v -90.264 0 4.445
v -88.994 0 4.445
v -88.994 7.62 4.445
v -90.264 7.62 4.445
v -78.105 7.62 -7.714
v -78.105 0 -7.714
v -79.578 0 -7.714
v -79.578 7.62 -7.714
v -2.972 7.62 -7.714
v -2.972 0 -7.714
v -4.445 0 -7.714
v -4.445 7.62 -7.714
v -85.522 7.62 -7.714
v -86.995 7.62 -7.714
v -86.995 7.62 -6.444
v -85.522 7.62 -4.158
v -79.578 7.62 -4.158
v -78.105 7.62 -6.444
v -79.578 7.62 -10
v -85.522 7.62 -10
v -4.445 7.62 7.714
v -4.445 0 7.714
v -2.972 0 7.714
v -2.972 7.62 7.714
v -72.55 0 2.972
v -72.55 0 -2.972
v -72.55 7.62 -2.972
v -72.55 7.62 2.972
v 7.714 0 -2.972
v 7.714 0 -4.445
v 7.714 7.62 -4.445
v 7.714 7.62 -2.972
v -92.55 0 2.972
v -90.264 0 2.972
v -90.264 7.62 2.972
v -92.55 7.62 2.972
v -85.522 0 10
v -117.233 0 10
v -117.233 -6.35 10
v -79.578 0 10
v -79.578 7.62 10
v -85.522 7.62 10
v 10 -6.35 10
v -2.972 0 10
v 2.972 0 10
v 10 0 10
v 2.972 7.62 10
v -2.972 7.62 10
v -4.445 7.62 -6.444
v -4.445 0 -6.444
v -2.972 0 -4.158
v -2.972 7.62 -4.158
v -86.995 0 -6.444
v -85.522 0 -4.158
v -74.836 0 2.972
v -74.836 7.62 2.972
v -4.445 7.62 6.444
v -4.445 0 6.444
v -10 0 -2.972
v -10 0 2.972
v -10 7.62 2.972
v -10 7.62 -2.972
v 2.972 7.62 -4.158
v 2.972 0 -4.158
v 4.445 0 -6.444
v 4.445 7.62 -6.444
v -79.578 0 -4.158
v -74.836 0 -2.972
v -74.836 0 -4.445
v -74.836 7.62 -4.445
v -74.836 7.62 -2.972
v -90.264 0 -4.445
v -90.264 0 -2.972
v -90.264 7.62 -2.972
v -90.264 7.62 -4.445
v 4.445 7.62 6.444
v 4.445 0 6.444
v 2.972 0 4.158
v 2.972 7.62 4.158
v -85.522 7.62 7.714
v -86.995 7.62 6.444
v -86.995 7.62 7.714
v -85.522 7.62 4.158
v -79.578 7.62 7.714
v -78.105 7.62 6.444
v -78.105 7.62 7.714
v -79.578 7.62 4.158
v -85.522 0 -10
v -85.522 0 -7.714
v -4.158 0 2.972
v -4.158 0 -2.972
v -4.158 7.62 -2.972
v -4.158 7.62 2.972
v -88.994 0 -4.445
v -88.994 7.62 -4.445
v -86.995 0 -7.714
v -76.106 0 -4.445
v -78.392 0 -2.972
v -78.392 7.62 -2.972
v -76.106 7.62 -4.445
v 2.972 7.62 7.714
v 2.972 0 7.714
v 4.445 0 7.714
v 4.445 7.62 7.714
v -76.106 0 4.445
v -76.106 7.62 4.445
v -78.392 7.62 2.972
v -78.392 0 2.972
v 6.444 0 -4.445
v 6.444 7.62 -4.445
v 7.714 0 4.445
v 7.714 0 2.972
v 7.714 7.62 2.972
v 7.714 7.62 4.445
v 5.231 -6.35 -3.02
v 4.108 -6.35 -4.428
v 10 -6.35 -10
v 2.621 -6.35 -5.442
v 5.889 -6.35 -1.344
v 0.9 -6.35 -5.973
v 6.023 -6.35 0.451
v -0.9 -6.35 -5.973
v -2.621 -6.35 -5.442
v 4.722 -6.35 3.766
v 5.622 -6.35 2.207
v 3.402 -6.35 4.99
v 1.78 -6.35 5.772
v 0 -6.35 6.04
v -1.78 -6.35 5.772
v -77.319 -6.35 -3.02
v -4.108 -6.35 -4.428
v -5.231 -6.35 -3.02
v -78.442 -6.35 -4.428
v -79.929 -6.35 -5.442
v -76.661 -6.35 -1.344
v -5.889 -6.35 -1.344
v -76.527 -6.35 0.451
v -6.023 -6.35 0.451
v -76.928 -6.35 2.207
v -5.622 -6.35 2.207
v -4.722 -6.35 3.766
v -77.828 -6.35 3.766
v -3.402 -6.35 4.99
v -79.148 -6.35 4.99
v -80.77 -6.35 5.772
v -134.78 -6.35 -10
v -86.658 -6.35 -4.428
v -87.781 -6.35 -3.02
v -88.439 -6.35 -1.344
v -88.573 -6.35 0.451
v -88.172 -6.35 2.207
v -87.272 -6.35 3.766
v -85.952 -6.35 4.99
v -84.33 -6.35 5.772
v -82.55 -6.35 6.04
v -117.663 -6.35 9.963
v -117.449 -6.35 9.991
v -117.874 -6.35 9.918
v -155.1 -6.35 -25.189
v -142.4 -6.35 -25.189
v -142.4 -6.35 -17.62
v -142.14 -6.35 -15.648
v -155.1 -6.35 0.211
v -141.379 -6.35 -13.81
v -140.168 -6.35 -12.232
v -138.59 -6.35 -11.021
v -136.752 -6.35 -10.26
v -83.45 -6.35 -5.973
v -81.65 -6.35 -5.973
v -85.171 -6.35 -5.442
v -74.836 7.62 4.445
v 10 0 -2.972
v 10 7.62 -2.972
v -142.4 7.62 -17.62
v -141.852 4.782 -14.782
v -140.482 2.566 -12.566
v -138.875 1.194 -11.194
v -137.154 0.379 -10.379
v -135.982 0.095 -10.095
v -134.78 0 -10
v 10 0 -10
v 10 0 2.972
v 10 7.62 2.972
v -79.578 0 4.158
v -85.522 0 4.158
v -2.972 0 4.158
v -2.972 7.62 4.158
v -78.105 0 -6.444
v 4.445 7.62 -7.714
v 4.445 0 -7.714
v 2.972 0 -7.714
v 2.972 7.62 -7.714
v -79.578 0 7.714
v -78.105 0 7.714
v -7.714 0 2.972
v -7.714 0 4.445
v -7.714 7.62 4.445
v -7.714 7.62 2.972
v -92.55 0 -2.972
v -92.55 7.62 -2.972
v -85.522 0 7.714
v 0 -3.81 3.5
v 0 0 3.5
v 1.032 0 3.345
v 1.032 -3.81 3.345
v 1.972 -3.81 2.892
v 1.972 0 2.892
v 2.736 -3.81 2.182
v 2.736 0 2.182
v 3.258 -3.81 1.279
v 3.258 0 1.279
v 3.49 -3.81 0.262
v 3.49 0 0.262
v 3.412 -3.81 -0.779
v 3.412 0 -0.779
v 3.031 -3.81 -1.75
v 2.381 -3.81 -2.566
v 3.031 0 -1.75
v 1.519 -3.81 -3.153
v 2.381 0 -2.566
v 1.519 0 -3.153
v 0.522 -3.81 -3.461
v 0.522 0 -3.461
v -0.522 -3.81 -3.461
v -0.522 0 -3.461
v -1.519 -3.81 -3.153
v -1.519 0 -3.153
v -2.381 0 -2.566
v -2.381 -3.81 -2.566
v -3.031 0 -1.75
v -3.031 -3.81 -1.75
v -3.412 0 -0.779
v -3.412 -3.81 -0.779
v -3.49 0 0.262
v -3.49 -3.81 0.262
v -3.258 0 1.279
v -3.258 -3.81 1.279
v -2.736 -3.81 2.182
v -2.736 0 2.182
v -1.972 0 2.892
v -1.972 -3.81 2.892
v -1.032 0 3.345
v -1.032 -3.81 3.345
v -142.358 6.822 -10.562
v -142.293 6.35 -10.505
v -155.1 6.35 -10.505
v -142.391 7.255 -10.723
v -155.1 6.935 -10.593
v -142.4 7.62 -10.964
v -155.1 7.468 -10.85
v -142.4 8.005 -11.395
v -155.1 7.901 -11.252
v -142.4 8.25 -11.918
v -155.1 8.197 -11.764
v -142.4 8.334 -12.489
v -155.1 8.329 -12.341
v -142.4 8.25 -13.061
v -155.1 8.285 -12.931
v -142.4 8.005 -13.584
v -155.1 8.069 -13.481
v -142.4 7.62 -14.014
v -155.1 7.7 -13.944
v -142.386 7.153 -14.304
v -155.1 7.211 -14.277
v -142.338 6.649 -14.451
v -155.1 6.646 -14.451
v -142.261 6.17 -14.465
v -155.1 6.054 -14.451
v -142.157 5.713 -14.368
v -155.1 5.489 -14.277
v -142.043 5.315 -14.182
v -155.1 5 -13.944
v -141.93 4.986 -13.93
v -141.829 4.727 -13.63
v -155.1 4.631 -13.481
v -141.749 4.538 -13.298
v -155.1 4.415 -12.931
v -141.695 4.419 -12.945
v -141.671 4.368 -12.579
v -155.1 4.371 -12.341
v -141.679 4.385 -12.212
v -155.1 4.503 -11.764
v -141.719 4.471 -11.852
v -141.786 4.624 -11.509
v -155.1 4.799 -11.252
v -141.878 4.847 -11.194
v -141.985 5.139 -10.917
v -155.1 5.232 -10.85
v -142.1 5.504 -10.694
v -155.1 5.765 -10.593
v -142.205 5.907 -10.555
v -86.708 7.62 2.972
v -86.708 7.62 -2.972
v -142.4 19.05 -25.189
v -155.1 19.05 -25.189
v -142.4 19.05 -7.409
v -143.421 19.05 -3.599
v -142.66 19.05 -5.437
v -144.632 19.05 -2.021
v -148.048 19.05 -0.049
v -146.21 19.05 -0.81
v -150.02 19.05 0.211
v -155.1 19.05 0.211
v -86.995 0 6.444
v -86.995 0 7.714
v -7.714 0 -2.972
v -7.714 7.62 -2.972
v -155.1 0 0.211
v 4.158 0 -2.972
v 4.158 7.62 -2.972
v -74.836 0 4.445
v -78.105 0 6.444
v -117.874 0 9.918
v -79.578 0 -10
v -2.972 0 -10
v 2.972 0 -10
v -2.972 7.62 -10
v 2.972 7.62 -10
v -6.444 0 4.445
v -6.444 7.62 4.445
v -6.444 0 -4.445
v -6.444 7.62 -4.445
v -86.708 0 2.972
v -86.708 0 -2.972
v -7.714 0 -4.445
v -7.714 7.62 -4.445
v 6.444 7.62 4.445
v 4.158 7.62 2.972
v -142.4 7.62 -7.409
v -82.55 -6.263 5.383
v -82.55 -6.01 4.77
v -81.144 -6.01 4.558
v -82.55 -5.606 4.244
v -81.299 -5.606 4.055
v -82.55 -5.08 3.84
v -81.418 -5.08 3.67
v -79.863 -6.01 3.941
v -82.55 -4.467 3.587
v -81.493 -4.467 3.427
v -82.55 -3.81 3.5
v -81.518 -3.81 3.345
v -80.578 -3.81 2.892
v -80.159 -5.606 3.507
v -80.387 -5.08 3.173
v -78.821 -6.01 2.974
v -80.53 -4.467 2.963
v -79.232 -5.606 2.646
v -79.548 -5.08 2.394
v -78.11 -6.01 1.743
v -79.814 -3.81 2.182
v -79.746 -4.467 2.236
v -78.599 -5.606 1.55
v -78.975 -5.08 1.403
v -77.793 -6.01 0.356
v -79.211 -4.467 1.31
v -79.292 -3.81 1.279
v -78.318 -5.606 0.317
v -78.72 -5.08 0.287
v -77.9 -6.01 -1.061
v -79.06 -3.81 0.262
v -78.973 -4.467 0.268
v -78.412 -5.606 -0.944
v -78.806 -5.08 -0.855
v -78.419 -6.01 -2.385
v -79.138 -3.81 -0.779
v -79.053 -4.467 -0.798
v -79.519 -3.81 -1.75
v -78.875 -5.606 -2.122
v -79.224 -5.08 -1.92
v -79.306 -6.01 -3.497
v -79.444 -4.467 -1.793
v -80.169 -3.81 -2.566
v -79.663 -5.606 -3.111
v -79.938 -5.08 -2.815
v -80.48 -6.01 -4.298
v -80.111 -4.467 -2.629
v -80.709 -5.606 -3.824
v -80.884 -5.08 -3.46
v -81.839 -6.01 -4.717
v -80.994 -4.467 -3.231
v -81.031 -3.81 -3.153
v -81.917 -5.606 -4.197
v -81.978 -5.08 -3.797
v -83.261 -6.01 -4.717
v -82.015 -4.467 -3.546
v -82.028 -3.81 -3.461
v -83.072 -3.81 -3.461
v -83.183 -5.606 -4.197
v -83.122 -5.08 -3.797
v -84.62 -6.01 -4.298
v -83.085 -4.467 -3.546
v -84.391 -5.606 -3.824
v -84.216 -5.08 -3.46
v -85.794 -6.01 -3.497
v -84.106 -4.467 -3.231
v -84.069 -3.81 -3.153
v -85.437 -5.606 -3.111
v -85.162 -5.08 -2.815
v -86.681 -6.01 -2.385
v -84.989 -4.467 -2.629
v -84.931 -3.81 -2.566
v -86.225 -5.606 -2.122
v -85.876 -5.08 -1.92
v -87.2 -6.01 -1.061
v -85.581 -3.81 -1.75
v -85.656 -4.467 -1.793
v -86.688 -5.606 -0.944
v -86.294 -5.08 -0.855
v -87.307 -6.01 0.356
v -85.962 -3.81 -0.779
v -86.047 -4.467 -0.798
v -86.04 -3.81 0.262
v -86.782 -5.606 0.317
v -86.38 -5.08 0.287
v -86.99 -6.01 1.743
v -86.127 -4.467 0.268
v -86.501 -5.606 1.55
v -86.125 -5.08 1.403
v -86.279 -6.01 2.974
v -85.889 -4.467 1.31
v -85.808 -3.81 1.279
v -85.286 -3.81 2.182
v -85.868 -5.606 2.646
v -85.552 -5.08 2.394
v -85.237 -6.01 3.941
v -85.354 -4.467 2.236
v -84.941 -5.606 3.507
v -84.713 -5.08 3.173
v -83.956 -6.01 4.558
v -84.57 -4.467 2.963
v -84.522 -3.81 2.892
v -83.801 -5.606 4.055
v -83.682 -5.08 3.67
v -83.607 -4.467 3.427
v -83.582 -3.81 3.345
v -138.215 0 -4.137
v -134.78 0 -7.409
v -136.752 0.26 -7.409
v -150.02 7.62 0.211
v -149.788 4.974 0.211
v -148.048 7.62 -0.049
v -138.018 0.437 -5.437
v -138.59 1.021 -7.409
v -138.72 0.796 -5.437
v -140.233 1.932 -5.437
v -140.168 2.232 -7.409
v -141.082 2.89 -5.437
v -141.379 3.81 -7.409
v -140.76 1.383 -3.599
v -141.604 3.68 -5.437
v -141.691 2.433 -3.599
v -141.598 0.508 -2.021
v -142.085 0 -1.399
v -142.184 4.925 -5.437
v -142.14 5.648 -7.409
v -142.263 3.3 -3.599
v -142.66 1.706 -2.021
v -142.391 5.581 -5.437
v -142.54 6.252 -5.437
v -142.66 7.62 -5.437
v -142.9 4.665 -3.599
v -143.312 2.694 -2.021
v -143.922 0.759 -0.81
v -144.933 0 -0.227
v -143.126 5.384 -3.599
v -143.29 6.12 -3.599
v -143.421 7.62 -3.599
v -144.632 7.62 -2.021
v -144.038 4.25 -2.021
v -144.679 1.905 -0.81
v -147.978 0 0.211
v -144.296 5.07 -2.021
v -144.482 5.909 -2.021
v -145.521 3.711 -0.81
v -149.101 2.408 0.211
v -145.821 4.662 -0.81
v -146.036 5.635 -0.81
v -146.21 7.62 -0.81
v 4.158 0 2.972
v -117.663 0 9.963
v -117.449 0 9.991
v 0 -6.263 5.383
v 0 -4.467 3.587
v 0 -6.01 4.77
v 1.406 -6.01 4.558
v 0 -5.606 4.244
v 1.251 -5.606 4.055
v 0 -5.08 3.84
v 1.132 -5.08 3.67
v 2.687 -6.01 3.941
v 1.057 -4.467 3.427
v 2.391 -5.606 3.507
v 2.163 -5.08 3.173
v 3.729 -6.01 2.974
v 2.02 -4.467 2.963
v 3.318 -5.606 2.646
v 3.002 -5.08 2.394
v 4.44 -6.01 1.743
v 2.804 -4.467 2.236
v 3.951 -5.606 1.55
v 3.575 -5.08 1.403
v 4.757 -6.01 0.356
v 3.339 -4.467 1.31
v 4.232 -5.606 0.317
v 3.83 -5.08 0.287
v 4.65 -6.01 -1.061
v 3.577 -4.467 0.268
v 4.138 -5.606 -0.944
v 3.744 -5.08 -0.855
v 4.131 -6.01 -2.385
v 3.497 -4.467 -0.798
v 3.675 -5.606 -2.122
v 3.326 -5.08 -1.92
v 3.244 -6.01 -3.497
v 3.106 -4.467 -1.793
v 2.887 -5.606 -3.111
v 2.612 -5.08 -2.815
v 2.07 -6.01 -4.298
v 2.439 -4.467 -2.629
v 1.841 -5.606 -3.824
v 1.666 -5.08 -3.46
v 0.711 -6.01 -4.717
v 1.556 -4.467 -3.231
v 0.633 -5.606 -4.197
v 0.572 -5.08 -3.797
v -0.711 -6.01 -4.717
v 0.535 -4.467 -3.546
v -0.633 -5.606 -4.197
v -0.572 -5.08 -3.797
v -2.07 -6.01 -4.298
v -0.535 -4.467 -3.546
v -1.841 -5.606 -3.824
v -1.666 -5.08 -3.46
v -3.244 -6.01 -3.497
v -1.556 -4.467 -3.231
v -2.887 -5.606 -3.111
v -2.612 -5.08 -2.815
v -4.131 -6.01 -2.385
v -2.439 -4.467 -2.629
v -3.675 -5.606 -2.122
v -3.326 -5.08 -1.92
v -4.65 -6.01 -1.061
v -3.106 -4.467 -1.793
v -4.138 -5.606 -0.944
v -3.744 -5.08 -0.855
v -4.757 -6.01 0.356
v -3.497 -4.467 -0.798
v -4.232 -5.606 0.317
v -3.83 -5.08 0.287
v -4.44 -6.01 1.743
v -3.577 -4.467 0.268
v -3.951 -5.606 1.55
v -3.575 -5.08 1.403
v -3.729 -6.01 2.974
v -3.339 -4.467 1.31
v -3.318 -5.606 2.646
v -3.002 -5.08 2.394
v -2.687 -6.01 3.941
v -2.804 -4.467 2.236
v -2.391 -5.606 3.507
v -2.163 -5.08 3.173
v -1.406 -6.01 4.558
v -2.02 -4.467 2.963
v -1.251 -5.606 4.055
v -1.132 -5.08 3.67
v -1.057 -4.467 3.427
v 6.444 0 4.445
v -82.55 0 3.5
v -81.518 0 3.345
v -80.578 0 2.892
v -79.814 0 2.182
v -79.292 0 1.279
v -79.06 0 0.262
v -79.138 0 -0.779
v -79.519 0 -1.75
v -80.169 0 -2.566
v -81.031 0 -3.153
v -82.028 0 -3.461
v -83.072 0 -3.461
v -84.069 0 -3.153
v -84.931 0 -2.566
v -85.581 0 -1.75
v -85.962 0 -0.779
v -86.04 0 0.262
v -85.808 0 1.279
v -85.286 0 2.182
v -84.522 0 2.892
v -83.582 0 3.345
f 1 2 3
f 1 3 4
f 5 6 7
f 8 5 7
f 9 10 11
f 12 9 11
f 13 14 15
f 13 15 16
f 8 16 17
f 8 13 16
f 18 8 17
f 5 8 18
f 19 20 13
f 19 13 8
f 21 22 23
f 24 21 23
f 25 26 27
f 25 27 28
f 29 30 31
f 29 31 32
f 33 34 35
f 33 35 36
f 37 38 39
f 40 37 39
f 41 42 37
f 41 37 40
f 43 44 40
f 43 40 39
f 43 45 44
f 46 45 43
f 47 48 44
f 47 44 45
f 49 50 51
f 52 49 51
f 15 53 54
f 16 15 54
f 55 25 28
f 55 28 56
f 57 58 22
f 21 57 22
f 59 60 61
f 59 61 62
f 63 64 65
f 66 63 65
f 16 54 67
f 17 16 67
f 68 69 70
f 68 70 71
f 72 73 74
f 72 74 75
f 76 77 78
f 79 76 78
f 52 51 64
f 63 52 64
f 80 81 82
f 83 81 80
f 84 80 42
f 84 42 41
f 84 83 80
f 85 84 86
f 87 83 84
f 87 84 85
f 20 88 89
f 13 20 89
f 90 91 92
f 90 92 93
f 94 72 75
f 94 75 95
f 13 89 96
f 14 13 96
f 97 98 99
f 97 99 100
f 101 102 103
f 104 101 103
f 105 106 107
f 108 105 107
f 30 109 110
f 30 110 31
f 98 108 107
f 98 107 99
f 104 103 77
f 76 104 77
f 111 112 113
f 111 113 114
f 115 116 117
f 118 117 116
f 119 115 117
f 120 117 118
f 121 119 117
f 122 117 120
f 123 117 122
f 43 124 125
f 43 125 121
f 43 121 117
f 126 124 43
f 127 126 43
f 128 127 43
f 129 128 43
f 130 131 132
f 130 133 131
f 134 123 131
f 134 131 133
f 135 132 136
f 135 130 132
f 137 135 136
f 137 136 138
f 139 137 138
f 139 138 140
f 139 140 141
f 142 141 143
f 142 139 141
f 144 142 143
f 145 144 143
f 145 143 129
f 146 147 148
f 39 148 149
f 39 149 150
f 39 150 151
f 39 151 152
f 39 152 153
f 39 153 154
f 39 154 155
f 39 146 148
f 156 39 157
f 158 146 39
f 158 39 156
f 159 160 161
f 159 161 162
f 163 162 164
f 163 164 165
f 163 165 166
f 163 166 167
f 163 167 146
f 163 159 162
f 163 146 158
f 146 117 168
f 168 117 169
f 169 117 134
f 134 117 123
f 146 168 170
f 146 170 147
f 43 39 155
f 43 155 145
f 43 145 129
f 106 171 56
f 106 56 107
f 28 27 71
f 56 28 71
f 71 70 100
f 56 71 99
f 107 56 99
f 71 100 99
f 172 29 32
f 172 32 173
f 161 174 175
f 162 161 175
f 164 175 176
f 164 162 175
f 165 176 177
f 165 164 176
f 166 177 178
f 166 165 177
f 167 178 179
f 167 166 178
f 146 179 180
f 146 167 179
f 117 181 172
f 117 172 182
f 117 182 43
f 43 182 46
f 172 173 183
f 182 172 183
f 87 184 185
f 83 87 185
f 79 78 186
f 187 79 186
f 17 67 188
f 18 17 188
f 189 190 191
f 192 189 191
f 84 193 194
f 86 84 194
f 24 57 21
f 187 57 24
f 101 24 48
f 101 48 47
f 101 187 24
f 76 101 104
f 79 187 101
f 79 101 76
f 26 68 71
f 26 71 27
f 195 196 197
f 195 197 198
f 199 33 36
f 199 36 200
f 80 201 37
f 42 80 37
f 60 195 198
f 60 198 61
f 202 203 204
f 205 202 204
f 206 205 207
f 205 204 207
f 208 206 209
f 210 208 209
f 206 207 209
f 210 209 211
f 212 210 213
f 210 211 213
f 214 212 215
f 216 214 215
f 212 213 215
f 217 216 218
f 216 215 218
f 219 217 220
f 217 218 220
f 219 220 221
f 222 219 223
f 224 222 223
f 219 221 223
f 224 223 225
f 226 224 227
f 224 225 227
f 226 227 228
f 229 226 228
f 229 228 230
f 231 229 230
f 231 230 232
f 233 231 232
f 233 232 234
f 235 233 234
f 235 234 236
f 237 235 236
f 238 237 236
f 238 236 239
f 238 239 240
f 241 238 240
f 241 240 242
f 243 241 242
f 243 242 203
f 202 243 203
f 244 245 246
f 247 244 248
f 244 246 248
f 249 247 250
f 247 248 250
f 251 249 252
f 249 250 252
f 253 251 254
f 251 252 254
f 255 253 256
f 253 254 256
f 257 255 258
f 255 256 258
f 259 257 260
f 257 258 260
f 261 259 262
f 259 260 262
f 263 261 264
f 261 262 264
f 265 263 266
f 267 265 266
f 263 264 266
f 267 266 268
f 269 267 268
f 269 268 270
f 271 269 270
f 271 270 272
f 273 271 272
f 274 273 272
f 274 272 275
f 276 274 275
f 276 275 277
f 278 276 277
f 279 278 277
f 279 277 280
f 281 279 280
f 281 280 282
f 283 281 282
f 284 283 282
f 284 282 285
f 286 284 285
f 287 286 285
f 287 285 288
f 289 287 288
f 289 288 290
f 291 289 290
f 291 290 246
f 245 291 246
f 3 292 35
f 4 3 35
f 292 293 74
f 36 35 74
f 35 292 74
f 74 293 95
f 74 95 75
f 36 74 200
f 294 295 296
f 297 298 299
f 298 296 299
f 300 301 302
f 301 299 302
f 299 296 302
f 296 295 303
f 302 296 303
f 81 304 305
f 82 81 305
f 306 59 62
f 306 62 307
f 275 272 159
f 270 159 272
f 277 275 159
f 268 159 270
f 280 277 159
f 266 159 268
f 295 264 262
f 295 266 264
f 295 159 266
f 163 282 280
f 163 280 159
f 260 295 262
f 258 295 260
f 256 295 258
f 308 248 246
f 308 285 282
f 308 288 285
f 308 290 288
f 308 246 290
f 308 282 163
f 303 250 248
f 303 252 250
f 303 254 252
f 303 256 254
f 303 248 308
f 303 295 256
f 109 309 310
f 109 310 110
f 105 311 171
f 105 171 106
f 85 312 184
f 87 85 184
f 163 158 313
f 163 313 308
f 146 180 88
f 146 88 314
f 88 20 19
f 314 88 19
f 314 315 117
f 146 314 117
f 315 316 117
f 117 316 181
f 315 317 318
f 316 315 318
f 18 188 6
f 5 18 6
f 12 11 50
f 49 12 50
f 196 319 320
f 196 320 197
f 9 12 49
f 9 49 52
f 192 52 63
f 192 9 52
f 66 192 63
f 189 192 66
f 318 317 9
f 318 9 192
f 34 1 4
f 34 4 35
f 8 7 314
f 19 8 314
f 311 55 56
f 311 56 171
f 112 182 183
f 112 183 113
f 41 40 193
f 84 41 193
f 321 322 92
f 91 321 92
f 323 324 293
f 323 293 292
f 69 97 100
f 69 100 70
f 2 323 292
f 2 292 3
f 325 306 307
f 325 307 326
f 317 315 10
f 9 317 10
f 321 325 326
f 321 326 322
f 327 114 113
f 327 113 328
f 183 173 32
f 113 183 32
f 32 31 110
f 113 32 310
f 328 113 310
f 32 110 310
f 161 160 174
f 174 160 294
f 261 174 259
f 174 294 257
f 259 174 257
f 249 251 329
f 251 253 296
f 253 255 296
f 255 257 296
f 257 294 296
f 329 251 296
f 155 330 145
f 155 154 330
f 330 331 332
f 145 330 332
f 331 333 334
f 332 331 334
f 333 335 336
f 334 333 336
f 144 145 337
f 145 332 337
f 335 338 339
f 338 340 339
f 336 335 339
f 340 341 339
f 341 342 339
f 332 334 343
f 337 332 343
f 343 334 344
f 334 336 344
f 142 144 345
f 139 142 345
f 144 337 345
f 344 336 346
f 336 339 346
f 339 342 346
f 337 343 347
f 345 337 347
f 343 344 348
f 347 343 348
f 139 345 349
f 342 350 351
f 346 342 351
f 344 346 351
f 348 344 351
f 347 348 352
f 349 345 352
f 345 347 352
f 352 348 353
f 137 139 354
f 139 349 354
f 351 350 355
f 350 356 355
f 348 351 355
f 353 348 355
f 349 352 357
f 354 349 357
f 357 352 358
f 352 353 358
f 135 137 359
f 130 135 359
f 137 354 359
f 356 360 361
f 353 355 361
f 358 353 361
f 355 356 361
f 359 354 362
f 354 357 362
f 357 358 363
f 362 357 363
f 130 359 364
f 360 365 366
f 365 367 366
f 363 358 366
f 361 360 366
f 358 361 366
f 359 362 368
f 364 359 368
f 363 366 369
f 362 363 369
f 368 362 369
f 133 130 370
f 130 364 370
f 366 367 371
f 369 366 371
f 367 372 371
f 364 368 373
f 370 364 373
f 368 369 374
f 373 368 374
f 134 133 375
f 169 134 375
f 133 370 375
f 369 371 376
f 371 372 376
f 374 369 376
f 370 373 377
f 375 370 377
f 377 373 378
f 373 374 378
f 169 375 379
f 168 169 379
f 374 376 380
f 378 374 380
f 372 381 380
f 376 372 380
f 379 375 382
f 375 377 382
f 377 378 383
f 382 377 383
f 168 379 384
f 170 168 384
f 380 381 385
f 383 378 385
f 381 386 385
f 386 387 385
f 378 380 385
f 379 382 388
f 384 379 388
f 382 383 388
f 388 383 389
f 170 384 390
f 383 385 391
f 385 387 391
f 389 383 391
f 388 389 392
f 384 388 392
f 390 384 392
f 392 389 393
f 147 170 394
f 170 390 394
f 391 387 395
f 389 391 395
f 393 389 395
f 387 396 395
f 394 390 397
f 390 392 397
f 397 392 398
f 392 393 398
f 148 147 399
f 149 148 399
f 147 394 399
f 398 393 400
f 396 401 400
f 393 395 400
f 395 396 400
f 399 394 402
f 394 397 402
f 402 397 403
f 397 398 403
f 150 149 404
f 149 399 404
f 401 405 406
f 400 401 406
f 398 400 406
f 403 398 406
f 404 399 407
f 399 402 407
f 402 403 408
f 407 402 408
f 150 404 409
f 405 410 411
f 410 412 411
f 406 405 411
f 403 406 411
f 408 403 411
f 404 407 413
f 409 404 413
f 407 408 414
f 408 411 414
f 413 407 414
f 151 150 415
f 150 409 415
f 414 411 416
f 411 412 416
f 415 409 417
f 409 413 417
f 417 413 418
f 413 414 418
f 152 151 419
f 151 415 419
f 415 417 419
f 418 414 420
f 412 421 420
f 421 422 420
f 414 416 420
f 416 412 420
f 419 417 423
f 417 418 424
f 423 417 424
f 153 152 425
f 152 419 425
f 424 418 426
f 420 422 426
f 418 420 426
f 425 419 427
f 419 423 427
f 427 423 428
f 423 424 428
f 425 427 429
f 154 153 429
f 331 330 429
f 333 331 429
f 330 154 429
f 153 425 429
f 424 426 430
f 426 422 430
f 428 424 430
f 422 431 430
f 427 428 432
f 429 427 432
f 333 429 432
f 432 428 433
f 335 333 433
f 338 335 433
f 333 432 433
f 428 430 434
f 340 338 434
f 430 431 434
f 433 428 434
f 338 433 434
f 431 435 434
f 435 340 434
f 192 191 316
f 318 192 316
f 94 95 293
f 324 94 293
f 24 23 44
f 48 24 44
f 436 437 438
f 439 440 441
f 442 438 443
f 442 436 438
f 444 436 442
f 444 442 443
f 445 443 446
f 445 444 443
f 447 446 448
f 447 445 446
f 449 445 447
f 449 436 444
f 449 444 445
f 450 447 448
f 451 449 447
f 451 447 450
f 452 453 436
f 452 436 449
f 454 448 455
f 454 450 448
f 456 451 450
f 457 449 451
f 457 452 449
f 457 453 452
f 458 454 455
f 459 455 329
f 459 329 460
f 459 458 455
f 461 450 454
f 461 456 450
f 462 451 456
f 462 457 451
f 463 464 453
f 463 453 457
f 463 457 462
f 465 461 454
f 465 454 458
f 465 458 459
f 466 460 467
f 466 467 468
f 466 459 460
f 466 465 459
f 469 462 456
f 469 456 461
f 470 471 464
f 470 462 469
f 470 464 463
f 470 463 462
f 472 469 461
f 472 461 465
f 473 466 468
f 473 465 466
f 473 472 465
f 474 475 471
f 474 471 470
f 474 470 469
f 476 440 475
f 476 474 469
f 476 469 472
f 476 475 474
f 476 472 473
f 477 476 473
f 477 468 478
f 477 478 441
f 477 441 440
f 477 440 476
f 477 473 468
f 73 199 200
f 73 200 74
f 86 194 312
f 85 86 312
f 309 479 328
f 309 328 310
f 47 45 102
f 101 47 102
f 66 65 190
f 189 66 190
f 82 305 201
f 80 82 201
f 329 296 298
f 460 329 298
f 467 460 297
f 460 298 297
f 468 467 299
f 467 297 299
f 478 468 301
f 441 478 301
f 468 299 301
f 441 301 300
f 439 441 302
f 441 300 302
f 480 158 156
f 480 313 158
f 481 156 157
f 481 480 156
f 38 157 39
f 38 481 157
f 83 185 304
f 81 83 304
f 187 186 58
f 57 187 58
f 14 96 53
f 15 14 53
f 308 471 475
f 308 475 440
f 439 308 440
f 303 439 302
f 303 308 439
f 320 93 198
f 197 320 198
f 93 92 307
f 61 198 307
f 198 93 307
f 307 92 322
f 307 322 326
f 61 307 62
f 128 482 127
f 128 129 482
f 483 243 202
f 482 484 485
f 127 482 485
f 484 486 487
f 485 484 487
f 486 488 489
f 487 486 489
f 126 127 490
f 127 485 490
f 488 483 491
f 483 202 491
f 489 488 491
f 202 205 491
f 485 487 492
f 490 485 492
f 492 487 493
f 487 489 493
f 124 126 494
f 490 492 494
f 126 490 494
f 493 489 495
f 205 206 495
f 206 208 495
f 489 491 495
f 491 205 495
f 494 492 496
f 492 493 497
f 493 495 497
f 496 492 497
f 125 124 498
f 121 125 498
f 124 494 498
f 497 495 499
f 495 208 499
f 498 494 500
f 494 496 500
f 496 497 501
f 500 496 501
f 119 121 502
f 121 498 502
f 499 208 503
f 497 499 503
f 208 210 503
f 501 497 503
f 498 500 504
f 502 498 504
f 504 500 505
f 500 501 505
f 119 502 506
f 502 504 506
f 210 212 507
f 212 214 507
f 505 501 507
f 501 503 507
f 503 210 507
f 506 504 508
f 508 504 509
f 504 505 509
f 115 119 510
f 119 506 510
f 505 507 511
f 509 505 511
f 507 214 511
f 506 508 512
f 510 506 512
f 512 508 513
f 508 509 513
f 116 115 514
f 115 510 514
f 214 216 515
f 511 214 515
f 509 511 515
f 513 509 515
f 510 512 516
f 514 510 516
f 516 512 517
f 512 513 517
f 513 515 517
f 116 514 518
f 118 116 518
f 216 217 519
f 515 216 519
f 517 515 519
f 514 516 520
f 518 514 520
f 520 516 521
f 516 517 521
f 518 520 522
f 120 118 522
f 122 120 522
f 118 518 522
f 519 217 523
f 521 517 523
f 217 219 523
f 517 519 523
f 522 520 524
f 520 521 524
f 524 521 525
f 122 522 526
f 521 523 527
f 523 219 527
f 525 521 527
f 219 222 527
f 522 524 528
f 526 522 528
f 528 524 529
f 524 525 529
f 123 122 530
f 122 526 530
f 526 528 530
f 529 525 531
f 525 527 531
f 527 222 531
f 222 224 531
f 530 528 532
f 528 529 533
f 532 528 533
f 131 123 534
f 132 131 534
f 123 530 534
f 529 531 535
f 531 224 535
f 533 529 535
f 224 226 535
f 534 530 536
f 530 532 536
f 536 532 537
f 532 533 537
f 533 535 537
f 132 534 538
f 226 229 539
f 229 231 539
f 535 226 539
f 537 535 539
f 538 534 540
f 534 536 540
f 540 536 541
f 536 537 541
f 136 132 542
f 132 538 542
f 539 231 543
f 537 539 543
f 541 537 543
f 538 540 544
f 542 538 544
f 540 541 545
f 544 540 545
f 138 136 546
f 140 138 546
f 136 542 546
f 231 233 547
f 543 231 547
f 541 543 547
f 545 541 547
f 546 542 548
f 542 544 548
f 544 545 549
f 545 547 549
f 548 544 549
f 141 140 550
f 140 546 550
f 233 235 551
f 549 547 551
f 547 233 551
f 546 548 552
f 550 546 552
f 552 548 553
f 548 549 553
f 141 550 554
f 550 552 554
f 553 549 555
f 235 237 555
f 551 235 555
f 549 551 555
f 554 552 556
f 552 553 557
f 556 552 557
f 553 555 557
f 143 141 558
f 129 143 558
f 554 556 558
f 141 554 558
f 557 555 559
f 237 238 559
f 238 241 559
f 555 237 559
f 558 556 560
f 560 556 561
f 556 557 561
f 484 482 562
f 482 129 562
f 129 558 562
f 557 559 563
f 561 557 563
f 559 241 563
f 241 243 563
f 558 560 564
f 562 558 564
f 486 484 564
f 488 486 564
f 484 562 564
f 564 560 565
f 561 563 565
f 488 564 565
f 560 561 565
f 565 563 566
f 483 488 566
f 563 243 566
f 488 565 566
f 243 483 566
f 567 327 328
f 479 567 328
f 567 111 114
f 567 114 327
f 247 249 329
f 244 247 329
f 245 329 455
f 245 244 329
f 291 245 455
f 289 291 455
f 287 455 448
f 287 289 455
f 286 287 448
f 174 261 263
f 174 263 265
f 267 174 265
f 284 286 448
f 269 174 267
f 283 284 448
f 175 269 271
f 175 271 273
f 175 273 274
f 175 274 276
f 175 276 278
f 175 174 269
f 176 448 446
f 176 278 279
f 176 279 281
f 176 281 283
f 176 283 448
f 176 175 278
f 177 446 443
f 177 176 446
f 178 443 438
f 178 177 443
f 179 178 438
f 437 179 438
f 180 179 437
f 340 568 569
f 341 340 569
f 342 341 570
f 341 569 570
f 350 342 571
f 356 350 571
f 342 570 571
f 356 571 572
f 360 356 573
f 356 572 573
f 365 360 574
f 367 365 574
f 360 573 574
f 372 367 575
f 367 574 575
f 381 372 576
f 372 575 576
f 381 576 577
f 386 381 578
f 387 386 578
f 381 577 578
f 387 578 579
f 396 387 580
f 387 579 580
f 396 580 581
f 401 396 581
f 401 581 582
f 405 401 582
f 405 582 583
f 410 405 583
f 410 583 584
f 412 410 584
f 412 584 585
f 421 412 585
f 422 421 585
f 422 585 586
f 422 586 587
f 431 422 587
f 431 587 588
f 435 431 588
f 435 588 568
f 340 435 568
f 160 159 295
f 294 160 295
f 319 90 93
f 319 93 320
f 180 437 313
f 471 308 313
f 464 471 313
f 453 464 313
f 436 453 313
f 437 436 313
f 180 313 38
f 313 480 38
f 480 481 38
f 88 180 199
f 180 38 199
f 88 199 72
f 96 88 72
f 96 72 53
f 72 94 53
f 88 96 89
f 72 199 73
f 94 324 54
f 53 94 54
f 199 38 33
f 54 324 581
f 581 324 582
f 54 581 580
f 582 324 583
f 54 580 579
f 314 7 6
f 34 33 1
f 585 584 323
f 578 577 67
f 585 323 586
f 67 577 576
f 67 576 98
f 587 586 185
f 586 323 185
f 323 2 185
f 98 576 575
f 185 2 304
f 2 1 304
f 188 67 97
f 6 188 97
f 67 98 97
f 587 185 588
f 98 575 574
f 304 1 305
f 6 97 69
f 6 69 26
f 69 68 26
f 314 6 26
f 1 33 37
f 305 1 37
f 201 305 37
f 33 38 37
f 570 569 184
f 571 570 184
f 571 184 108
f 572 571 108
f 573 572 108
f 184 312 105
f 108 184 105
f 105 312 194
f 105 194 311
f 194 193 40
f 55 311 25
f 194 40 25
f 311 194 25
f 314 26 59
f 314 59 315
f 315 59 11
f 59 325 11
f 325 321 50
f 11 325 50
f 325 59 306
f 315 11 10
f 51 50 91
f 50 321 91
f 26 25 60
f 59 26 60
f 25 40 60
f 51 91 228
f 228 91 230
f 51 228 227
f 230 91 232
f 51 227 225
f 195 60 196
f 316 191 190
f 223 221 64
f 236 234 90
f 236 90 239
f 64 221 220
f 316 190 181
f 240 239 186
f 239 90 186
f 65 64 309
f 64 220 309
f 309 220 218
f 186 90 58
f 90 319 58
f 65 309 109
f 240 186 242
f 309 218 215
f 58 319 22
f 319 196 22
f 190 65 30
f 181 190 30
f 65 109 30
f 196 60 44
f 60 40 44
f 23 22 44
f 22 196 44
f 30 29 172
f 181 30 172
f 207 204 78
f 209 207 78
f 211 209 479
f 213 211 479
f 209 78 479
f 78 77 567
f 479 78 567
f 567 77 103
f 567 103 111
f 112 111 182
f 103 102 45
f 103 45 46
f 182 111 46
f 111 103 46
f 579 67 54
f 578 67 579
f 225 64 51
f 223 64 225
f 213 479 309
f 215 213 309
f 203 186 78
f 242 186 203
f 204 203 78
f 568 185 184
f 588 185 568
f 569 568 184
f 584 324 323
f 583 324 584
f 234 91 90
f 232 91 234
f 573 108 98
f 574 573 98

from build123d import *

# Parameters (mm, degrees)
BOSS_EXTRUDE1_DEPTH   = 7.62
BOSS_EXTRUDE1_2_DEPTH = 7.62
BOSS_EXTRUDE1_3_DEPTH = 7.62
BOSS_EXTRUDE1_4_DEPTH = 7.62
SKETCH2_W             = 165.1
SKETCH2_H             = 20
BOSS_EXTRUDE2_DEPTH   = 6.35
LPATTERN2_COUNT       = 2
LPATTERN2_PITCH       = 82.55
CUT_EXTRUDE1_DEPTH    = 157.048617104
FILLET1_R             = 2.54
SKETCH6_W             = 25.4
SKETCH6_H             = 25.4
BOSS_EXTRUDE7_DEPTH   = 12.7
FILLET3_R             = 7.62
FILLET5_R             = 7.62
SKETCH11_R            = 1.984375
CUT_EXTRUDE3_DEPTH    = 169.09345118
SKETCH13_R            = 3.5
CUT_EXTRUDE5_DEPTH    = 159.282684864
FILLET6_R             = 2.54


with BuildPart() as part:
    # Sketch1 → Boss-Extrude1 (new body)
    with BuildSketch(Plane(origin=(0, 0, 0), x_dir=(1, 0, 0), z_dir=(0, 1, 0))):
        Polygon((-2.9718, 10), (-2.9718, 7.714), (-4.4450054, 7.714), (-4.4450054, 6.444), (-2.9718, 4.158), (2.9718, 4.158), (4.4449946, 6.444), (4.4449946, 7.714), (2.9718, 7.714), (2.9718, 10), align=None)
    boss_extrude1 = extrude(amount=BOSS_EXTRUDE1_DEPTH)



with BuildPart() as body_2:
    # Sketch1 → Boss-Extrude1 2 (new body)
    with BuildSketch(Plane(origin=(0, 0, 0), x_dir=(1, 0, 0), z_dir=(0, 1, 0))):
        Polygon((4.158, -2.9718), (4.158, 2.9718), (6.444, 4.4449946), (7.714, 4.4449946), (7.714, 2.9718), (10, 2.9718), (10, -2.9718), (7.714, -2.9718), (7.714, -4.4450054), (6.444, -4.4450054), align=None)
    boss_extrude1_2 = extrude(amount=BOSS_EXTRUDE1_2_DEPTH)


with BuildPart() as body_3:
    # Sketch1 → Boss-Extrude1 3 (new body)
    with BuildSketch(Plane(origin=(0, 0, 0), x_dir=(1, 0, 0), z_dir=(0, 1, 0))):
        Polygon((4.4450054, -6.444), (2.9718, -4.158), (-2.9718, -4.158), (-4.4449946, -6.444), (-4.4449946, -7.714), (-2.9718, -7.714), (-2.9718, -10), (2.9718, -10), (2.9718, -7.714), (4.4450054, -7.714), align=None)
    boss_extrude1_3 = extrude(amount=BOSS_EXTRUDE1_3_DEPTH)


with BuildPart() as body_4:
    # Sketch1 → Boss-Extrude1 4 (new body)
    with BuildSketch(Plane(origin=(0, 0, 0), x_dir=(1, 0, 0), z_dir=(0, 1, 0))):
        Polygon((-10, -2.9718), (-10, 2.9718), (-7.714, 2.9718), (-7.714, 4.4450054), (-6.444, 4.4450054), (-4.158, 2.9718), (-4.158, -2.9718), (-6.444, -4.4449946), (-7.714, -4.4449946), (-7.714, -2.9718), align=None)
    boss_extrude1_4 = extrude(amount=BOSS_EXTRUDE1_4_DEPTH)


with BuildPart() as part_1:
    add(part.part)

    add(body_2.part)  # Boss-Extrude2 merges body 2

    add(body_3.part)  # Boss-Extrude2 merges body 3

    add(body_4.part)  # Boss-Extrude2 merges body 4
    # Sketch2 → Boss-Extrude2 (add)
    with BuildSketch(Plane.XZ):
        with Locations((-72.55, 0)):
            Rectangle(SKETCH2_W, SKETCH2_H)
    extrude(amount=BOSS_EXTRUDE2_DEPTH)

    # LPattern2: Boss-Extrude1, Boss-Extrude1 2, Boss-Extrude1 3, Boss-Extrude1 4 ×2
    with Locations(*[(-i * LPATTERN2_PITCH, 0, 0) for i in range(1, LPATTERN2_COUNT)]):
        add(boss_extrude1)
        add(boss_extrude1_2)
        add(boss_extrude1_3)
        add(boss_extrude1_4)

    # Sketch4 → Cut-Extrude1 (cut, through all)
    with BuildSketch(Plane(origin=(0, -6.35, 0), x_dir=(-1, 0, 0), z_dir=(0, -1, 0))):
        Polygon((155.1, -10), (117.5588, -10), (155.1, -0.2108), align=None)
    extrude(amount=-CUT_EXTRUDE1_DEPTH, mode=Mode.SUBTRACT)

    # Fillet1
    fillet1_edges = [part_1.edges().sort_by_distance(p)[0] for p in [
        (-117.5588, -3.175, 10),
    ]]
    fillet(fillet1_edges, radius=FILLET1_R)

    # Sketch6 → Boss-Extrude7 (add)
    with BuildSketch(Plane.ZY.offset(155.1)):
        with Locations((-12.4892, 6.35)):
            Rectangle(SKETCH6_W, SKETCH6_H)
    extrude(amount=-BOSS_EXTRUDE7_DEPTH)

    # Fillet3
    fillet3_edges = [part_1.edges().sort_by_distance(p)[0] for p in [
        (-142.4, 0, -4.8946),
        (-142.4, -3.175, -10),
    ]]
    fillet(fillet3_edges, radius=FILLET3_R)

    # Fillet5
    # the kernel refuses this fillet: 7.62 mm, written as the material it takes off along each edge
    with BuildSketch(Plane(origin=(-142.4, 38.1, 0.2108), x_dir=(-1, 0, 0), z_dir=(0, -1, 0))) as fillet5_piece_1:
        with BuildLine():
            CenterArc((FILLET5_R, FILLET5_R), FILLET5_R, 180, 90)
            Line((0, FILLET5_R), (0, 0))
            Line((0, 0), (FILLET5_R, 0))
        make_face()
    extrude(amount=30.48, mode=Mode.SUBTRACT)
    with BuildSketch(Plane(origin=(-134.78, 7.62, 0.2108), x_dir=(0.5976672776328269, 0.8017442392976487, 0), z_dir=(-0.8017442392976487, 0.5976672776328269, 0))) as fillet5_piece_2_section:
        with BuildLine():
            CenterArc((7.62 + FILLET5_R, FILLET5_R), FILLET5_R, 180, 90)
            Line((7.62, FILLET5_R), (7.62, 0))
            Line((7.62, 0), (7.62 + FILLET5_R, 0))
        make_face()
    fillet5_piece_2 = revolve(axis=Axis((-134.78, 7.62, 0.2108), (0, 0, -1)), revolution_arc=233.296989237, mode=Mode.PRIVATE)
    fillet5_piece_2 = split(fillet5_piece_2, bisect_by=Plane(origin=(-140.494534821, 0, -2.163807691), z_dir=(0, 1, 0)), keep=Keep.TOP, mode=Mode.PRIVATE)
    add(fillet5_piece_2, mode=Mode.SUBTRACT)

    # Sketch11 → Cut-Extrude3 (cut, through all)
    with BuildSketch(Plane.ZY.offset(155.1)):
        with Locations((-12.4892, 6.35)):
            Circle(SKETCH11_R)
    extrude(amount=-CUT_EXTRUDE3_DEPTH, mode=Mode.SUBTRACT)

    # Sketch13 → Cut-Extrude5 (cut, through all)
    with BuildSketch(Plane(origin=(0, 0, 0), x_dir=(1, 0, 0), z_dir=(0, 1, 0))):
        with Locations(Location((0, 0, 0), (0, 0, 270))):
            Circle(SKETCH13_R)
        with Locations(Location((-82.55, 0, 0), (0, 0, 270))):
            Circle(SKETCH13_R)
    extrude(amount=-CUT_EXTRUDE5_DEPTH, mode=Mode.SUBTRACT)

    # Fillet6
    fillet6_edges = [part_1.edges().sort_by_distance(p)[0] for p in [
        (0, -6.35, -3.5),
        (-82.55, -6.35, -3.5),
    ]]
    fillet(fillet6_edges, radius=FILLET6_R)


solid = part_1.part
